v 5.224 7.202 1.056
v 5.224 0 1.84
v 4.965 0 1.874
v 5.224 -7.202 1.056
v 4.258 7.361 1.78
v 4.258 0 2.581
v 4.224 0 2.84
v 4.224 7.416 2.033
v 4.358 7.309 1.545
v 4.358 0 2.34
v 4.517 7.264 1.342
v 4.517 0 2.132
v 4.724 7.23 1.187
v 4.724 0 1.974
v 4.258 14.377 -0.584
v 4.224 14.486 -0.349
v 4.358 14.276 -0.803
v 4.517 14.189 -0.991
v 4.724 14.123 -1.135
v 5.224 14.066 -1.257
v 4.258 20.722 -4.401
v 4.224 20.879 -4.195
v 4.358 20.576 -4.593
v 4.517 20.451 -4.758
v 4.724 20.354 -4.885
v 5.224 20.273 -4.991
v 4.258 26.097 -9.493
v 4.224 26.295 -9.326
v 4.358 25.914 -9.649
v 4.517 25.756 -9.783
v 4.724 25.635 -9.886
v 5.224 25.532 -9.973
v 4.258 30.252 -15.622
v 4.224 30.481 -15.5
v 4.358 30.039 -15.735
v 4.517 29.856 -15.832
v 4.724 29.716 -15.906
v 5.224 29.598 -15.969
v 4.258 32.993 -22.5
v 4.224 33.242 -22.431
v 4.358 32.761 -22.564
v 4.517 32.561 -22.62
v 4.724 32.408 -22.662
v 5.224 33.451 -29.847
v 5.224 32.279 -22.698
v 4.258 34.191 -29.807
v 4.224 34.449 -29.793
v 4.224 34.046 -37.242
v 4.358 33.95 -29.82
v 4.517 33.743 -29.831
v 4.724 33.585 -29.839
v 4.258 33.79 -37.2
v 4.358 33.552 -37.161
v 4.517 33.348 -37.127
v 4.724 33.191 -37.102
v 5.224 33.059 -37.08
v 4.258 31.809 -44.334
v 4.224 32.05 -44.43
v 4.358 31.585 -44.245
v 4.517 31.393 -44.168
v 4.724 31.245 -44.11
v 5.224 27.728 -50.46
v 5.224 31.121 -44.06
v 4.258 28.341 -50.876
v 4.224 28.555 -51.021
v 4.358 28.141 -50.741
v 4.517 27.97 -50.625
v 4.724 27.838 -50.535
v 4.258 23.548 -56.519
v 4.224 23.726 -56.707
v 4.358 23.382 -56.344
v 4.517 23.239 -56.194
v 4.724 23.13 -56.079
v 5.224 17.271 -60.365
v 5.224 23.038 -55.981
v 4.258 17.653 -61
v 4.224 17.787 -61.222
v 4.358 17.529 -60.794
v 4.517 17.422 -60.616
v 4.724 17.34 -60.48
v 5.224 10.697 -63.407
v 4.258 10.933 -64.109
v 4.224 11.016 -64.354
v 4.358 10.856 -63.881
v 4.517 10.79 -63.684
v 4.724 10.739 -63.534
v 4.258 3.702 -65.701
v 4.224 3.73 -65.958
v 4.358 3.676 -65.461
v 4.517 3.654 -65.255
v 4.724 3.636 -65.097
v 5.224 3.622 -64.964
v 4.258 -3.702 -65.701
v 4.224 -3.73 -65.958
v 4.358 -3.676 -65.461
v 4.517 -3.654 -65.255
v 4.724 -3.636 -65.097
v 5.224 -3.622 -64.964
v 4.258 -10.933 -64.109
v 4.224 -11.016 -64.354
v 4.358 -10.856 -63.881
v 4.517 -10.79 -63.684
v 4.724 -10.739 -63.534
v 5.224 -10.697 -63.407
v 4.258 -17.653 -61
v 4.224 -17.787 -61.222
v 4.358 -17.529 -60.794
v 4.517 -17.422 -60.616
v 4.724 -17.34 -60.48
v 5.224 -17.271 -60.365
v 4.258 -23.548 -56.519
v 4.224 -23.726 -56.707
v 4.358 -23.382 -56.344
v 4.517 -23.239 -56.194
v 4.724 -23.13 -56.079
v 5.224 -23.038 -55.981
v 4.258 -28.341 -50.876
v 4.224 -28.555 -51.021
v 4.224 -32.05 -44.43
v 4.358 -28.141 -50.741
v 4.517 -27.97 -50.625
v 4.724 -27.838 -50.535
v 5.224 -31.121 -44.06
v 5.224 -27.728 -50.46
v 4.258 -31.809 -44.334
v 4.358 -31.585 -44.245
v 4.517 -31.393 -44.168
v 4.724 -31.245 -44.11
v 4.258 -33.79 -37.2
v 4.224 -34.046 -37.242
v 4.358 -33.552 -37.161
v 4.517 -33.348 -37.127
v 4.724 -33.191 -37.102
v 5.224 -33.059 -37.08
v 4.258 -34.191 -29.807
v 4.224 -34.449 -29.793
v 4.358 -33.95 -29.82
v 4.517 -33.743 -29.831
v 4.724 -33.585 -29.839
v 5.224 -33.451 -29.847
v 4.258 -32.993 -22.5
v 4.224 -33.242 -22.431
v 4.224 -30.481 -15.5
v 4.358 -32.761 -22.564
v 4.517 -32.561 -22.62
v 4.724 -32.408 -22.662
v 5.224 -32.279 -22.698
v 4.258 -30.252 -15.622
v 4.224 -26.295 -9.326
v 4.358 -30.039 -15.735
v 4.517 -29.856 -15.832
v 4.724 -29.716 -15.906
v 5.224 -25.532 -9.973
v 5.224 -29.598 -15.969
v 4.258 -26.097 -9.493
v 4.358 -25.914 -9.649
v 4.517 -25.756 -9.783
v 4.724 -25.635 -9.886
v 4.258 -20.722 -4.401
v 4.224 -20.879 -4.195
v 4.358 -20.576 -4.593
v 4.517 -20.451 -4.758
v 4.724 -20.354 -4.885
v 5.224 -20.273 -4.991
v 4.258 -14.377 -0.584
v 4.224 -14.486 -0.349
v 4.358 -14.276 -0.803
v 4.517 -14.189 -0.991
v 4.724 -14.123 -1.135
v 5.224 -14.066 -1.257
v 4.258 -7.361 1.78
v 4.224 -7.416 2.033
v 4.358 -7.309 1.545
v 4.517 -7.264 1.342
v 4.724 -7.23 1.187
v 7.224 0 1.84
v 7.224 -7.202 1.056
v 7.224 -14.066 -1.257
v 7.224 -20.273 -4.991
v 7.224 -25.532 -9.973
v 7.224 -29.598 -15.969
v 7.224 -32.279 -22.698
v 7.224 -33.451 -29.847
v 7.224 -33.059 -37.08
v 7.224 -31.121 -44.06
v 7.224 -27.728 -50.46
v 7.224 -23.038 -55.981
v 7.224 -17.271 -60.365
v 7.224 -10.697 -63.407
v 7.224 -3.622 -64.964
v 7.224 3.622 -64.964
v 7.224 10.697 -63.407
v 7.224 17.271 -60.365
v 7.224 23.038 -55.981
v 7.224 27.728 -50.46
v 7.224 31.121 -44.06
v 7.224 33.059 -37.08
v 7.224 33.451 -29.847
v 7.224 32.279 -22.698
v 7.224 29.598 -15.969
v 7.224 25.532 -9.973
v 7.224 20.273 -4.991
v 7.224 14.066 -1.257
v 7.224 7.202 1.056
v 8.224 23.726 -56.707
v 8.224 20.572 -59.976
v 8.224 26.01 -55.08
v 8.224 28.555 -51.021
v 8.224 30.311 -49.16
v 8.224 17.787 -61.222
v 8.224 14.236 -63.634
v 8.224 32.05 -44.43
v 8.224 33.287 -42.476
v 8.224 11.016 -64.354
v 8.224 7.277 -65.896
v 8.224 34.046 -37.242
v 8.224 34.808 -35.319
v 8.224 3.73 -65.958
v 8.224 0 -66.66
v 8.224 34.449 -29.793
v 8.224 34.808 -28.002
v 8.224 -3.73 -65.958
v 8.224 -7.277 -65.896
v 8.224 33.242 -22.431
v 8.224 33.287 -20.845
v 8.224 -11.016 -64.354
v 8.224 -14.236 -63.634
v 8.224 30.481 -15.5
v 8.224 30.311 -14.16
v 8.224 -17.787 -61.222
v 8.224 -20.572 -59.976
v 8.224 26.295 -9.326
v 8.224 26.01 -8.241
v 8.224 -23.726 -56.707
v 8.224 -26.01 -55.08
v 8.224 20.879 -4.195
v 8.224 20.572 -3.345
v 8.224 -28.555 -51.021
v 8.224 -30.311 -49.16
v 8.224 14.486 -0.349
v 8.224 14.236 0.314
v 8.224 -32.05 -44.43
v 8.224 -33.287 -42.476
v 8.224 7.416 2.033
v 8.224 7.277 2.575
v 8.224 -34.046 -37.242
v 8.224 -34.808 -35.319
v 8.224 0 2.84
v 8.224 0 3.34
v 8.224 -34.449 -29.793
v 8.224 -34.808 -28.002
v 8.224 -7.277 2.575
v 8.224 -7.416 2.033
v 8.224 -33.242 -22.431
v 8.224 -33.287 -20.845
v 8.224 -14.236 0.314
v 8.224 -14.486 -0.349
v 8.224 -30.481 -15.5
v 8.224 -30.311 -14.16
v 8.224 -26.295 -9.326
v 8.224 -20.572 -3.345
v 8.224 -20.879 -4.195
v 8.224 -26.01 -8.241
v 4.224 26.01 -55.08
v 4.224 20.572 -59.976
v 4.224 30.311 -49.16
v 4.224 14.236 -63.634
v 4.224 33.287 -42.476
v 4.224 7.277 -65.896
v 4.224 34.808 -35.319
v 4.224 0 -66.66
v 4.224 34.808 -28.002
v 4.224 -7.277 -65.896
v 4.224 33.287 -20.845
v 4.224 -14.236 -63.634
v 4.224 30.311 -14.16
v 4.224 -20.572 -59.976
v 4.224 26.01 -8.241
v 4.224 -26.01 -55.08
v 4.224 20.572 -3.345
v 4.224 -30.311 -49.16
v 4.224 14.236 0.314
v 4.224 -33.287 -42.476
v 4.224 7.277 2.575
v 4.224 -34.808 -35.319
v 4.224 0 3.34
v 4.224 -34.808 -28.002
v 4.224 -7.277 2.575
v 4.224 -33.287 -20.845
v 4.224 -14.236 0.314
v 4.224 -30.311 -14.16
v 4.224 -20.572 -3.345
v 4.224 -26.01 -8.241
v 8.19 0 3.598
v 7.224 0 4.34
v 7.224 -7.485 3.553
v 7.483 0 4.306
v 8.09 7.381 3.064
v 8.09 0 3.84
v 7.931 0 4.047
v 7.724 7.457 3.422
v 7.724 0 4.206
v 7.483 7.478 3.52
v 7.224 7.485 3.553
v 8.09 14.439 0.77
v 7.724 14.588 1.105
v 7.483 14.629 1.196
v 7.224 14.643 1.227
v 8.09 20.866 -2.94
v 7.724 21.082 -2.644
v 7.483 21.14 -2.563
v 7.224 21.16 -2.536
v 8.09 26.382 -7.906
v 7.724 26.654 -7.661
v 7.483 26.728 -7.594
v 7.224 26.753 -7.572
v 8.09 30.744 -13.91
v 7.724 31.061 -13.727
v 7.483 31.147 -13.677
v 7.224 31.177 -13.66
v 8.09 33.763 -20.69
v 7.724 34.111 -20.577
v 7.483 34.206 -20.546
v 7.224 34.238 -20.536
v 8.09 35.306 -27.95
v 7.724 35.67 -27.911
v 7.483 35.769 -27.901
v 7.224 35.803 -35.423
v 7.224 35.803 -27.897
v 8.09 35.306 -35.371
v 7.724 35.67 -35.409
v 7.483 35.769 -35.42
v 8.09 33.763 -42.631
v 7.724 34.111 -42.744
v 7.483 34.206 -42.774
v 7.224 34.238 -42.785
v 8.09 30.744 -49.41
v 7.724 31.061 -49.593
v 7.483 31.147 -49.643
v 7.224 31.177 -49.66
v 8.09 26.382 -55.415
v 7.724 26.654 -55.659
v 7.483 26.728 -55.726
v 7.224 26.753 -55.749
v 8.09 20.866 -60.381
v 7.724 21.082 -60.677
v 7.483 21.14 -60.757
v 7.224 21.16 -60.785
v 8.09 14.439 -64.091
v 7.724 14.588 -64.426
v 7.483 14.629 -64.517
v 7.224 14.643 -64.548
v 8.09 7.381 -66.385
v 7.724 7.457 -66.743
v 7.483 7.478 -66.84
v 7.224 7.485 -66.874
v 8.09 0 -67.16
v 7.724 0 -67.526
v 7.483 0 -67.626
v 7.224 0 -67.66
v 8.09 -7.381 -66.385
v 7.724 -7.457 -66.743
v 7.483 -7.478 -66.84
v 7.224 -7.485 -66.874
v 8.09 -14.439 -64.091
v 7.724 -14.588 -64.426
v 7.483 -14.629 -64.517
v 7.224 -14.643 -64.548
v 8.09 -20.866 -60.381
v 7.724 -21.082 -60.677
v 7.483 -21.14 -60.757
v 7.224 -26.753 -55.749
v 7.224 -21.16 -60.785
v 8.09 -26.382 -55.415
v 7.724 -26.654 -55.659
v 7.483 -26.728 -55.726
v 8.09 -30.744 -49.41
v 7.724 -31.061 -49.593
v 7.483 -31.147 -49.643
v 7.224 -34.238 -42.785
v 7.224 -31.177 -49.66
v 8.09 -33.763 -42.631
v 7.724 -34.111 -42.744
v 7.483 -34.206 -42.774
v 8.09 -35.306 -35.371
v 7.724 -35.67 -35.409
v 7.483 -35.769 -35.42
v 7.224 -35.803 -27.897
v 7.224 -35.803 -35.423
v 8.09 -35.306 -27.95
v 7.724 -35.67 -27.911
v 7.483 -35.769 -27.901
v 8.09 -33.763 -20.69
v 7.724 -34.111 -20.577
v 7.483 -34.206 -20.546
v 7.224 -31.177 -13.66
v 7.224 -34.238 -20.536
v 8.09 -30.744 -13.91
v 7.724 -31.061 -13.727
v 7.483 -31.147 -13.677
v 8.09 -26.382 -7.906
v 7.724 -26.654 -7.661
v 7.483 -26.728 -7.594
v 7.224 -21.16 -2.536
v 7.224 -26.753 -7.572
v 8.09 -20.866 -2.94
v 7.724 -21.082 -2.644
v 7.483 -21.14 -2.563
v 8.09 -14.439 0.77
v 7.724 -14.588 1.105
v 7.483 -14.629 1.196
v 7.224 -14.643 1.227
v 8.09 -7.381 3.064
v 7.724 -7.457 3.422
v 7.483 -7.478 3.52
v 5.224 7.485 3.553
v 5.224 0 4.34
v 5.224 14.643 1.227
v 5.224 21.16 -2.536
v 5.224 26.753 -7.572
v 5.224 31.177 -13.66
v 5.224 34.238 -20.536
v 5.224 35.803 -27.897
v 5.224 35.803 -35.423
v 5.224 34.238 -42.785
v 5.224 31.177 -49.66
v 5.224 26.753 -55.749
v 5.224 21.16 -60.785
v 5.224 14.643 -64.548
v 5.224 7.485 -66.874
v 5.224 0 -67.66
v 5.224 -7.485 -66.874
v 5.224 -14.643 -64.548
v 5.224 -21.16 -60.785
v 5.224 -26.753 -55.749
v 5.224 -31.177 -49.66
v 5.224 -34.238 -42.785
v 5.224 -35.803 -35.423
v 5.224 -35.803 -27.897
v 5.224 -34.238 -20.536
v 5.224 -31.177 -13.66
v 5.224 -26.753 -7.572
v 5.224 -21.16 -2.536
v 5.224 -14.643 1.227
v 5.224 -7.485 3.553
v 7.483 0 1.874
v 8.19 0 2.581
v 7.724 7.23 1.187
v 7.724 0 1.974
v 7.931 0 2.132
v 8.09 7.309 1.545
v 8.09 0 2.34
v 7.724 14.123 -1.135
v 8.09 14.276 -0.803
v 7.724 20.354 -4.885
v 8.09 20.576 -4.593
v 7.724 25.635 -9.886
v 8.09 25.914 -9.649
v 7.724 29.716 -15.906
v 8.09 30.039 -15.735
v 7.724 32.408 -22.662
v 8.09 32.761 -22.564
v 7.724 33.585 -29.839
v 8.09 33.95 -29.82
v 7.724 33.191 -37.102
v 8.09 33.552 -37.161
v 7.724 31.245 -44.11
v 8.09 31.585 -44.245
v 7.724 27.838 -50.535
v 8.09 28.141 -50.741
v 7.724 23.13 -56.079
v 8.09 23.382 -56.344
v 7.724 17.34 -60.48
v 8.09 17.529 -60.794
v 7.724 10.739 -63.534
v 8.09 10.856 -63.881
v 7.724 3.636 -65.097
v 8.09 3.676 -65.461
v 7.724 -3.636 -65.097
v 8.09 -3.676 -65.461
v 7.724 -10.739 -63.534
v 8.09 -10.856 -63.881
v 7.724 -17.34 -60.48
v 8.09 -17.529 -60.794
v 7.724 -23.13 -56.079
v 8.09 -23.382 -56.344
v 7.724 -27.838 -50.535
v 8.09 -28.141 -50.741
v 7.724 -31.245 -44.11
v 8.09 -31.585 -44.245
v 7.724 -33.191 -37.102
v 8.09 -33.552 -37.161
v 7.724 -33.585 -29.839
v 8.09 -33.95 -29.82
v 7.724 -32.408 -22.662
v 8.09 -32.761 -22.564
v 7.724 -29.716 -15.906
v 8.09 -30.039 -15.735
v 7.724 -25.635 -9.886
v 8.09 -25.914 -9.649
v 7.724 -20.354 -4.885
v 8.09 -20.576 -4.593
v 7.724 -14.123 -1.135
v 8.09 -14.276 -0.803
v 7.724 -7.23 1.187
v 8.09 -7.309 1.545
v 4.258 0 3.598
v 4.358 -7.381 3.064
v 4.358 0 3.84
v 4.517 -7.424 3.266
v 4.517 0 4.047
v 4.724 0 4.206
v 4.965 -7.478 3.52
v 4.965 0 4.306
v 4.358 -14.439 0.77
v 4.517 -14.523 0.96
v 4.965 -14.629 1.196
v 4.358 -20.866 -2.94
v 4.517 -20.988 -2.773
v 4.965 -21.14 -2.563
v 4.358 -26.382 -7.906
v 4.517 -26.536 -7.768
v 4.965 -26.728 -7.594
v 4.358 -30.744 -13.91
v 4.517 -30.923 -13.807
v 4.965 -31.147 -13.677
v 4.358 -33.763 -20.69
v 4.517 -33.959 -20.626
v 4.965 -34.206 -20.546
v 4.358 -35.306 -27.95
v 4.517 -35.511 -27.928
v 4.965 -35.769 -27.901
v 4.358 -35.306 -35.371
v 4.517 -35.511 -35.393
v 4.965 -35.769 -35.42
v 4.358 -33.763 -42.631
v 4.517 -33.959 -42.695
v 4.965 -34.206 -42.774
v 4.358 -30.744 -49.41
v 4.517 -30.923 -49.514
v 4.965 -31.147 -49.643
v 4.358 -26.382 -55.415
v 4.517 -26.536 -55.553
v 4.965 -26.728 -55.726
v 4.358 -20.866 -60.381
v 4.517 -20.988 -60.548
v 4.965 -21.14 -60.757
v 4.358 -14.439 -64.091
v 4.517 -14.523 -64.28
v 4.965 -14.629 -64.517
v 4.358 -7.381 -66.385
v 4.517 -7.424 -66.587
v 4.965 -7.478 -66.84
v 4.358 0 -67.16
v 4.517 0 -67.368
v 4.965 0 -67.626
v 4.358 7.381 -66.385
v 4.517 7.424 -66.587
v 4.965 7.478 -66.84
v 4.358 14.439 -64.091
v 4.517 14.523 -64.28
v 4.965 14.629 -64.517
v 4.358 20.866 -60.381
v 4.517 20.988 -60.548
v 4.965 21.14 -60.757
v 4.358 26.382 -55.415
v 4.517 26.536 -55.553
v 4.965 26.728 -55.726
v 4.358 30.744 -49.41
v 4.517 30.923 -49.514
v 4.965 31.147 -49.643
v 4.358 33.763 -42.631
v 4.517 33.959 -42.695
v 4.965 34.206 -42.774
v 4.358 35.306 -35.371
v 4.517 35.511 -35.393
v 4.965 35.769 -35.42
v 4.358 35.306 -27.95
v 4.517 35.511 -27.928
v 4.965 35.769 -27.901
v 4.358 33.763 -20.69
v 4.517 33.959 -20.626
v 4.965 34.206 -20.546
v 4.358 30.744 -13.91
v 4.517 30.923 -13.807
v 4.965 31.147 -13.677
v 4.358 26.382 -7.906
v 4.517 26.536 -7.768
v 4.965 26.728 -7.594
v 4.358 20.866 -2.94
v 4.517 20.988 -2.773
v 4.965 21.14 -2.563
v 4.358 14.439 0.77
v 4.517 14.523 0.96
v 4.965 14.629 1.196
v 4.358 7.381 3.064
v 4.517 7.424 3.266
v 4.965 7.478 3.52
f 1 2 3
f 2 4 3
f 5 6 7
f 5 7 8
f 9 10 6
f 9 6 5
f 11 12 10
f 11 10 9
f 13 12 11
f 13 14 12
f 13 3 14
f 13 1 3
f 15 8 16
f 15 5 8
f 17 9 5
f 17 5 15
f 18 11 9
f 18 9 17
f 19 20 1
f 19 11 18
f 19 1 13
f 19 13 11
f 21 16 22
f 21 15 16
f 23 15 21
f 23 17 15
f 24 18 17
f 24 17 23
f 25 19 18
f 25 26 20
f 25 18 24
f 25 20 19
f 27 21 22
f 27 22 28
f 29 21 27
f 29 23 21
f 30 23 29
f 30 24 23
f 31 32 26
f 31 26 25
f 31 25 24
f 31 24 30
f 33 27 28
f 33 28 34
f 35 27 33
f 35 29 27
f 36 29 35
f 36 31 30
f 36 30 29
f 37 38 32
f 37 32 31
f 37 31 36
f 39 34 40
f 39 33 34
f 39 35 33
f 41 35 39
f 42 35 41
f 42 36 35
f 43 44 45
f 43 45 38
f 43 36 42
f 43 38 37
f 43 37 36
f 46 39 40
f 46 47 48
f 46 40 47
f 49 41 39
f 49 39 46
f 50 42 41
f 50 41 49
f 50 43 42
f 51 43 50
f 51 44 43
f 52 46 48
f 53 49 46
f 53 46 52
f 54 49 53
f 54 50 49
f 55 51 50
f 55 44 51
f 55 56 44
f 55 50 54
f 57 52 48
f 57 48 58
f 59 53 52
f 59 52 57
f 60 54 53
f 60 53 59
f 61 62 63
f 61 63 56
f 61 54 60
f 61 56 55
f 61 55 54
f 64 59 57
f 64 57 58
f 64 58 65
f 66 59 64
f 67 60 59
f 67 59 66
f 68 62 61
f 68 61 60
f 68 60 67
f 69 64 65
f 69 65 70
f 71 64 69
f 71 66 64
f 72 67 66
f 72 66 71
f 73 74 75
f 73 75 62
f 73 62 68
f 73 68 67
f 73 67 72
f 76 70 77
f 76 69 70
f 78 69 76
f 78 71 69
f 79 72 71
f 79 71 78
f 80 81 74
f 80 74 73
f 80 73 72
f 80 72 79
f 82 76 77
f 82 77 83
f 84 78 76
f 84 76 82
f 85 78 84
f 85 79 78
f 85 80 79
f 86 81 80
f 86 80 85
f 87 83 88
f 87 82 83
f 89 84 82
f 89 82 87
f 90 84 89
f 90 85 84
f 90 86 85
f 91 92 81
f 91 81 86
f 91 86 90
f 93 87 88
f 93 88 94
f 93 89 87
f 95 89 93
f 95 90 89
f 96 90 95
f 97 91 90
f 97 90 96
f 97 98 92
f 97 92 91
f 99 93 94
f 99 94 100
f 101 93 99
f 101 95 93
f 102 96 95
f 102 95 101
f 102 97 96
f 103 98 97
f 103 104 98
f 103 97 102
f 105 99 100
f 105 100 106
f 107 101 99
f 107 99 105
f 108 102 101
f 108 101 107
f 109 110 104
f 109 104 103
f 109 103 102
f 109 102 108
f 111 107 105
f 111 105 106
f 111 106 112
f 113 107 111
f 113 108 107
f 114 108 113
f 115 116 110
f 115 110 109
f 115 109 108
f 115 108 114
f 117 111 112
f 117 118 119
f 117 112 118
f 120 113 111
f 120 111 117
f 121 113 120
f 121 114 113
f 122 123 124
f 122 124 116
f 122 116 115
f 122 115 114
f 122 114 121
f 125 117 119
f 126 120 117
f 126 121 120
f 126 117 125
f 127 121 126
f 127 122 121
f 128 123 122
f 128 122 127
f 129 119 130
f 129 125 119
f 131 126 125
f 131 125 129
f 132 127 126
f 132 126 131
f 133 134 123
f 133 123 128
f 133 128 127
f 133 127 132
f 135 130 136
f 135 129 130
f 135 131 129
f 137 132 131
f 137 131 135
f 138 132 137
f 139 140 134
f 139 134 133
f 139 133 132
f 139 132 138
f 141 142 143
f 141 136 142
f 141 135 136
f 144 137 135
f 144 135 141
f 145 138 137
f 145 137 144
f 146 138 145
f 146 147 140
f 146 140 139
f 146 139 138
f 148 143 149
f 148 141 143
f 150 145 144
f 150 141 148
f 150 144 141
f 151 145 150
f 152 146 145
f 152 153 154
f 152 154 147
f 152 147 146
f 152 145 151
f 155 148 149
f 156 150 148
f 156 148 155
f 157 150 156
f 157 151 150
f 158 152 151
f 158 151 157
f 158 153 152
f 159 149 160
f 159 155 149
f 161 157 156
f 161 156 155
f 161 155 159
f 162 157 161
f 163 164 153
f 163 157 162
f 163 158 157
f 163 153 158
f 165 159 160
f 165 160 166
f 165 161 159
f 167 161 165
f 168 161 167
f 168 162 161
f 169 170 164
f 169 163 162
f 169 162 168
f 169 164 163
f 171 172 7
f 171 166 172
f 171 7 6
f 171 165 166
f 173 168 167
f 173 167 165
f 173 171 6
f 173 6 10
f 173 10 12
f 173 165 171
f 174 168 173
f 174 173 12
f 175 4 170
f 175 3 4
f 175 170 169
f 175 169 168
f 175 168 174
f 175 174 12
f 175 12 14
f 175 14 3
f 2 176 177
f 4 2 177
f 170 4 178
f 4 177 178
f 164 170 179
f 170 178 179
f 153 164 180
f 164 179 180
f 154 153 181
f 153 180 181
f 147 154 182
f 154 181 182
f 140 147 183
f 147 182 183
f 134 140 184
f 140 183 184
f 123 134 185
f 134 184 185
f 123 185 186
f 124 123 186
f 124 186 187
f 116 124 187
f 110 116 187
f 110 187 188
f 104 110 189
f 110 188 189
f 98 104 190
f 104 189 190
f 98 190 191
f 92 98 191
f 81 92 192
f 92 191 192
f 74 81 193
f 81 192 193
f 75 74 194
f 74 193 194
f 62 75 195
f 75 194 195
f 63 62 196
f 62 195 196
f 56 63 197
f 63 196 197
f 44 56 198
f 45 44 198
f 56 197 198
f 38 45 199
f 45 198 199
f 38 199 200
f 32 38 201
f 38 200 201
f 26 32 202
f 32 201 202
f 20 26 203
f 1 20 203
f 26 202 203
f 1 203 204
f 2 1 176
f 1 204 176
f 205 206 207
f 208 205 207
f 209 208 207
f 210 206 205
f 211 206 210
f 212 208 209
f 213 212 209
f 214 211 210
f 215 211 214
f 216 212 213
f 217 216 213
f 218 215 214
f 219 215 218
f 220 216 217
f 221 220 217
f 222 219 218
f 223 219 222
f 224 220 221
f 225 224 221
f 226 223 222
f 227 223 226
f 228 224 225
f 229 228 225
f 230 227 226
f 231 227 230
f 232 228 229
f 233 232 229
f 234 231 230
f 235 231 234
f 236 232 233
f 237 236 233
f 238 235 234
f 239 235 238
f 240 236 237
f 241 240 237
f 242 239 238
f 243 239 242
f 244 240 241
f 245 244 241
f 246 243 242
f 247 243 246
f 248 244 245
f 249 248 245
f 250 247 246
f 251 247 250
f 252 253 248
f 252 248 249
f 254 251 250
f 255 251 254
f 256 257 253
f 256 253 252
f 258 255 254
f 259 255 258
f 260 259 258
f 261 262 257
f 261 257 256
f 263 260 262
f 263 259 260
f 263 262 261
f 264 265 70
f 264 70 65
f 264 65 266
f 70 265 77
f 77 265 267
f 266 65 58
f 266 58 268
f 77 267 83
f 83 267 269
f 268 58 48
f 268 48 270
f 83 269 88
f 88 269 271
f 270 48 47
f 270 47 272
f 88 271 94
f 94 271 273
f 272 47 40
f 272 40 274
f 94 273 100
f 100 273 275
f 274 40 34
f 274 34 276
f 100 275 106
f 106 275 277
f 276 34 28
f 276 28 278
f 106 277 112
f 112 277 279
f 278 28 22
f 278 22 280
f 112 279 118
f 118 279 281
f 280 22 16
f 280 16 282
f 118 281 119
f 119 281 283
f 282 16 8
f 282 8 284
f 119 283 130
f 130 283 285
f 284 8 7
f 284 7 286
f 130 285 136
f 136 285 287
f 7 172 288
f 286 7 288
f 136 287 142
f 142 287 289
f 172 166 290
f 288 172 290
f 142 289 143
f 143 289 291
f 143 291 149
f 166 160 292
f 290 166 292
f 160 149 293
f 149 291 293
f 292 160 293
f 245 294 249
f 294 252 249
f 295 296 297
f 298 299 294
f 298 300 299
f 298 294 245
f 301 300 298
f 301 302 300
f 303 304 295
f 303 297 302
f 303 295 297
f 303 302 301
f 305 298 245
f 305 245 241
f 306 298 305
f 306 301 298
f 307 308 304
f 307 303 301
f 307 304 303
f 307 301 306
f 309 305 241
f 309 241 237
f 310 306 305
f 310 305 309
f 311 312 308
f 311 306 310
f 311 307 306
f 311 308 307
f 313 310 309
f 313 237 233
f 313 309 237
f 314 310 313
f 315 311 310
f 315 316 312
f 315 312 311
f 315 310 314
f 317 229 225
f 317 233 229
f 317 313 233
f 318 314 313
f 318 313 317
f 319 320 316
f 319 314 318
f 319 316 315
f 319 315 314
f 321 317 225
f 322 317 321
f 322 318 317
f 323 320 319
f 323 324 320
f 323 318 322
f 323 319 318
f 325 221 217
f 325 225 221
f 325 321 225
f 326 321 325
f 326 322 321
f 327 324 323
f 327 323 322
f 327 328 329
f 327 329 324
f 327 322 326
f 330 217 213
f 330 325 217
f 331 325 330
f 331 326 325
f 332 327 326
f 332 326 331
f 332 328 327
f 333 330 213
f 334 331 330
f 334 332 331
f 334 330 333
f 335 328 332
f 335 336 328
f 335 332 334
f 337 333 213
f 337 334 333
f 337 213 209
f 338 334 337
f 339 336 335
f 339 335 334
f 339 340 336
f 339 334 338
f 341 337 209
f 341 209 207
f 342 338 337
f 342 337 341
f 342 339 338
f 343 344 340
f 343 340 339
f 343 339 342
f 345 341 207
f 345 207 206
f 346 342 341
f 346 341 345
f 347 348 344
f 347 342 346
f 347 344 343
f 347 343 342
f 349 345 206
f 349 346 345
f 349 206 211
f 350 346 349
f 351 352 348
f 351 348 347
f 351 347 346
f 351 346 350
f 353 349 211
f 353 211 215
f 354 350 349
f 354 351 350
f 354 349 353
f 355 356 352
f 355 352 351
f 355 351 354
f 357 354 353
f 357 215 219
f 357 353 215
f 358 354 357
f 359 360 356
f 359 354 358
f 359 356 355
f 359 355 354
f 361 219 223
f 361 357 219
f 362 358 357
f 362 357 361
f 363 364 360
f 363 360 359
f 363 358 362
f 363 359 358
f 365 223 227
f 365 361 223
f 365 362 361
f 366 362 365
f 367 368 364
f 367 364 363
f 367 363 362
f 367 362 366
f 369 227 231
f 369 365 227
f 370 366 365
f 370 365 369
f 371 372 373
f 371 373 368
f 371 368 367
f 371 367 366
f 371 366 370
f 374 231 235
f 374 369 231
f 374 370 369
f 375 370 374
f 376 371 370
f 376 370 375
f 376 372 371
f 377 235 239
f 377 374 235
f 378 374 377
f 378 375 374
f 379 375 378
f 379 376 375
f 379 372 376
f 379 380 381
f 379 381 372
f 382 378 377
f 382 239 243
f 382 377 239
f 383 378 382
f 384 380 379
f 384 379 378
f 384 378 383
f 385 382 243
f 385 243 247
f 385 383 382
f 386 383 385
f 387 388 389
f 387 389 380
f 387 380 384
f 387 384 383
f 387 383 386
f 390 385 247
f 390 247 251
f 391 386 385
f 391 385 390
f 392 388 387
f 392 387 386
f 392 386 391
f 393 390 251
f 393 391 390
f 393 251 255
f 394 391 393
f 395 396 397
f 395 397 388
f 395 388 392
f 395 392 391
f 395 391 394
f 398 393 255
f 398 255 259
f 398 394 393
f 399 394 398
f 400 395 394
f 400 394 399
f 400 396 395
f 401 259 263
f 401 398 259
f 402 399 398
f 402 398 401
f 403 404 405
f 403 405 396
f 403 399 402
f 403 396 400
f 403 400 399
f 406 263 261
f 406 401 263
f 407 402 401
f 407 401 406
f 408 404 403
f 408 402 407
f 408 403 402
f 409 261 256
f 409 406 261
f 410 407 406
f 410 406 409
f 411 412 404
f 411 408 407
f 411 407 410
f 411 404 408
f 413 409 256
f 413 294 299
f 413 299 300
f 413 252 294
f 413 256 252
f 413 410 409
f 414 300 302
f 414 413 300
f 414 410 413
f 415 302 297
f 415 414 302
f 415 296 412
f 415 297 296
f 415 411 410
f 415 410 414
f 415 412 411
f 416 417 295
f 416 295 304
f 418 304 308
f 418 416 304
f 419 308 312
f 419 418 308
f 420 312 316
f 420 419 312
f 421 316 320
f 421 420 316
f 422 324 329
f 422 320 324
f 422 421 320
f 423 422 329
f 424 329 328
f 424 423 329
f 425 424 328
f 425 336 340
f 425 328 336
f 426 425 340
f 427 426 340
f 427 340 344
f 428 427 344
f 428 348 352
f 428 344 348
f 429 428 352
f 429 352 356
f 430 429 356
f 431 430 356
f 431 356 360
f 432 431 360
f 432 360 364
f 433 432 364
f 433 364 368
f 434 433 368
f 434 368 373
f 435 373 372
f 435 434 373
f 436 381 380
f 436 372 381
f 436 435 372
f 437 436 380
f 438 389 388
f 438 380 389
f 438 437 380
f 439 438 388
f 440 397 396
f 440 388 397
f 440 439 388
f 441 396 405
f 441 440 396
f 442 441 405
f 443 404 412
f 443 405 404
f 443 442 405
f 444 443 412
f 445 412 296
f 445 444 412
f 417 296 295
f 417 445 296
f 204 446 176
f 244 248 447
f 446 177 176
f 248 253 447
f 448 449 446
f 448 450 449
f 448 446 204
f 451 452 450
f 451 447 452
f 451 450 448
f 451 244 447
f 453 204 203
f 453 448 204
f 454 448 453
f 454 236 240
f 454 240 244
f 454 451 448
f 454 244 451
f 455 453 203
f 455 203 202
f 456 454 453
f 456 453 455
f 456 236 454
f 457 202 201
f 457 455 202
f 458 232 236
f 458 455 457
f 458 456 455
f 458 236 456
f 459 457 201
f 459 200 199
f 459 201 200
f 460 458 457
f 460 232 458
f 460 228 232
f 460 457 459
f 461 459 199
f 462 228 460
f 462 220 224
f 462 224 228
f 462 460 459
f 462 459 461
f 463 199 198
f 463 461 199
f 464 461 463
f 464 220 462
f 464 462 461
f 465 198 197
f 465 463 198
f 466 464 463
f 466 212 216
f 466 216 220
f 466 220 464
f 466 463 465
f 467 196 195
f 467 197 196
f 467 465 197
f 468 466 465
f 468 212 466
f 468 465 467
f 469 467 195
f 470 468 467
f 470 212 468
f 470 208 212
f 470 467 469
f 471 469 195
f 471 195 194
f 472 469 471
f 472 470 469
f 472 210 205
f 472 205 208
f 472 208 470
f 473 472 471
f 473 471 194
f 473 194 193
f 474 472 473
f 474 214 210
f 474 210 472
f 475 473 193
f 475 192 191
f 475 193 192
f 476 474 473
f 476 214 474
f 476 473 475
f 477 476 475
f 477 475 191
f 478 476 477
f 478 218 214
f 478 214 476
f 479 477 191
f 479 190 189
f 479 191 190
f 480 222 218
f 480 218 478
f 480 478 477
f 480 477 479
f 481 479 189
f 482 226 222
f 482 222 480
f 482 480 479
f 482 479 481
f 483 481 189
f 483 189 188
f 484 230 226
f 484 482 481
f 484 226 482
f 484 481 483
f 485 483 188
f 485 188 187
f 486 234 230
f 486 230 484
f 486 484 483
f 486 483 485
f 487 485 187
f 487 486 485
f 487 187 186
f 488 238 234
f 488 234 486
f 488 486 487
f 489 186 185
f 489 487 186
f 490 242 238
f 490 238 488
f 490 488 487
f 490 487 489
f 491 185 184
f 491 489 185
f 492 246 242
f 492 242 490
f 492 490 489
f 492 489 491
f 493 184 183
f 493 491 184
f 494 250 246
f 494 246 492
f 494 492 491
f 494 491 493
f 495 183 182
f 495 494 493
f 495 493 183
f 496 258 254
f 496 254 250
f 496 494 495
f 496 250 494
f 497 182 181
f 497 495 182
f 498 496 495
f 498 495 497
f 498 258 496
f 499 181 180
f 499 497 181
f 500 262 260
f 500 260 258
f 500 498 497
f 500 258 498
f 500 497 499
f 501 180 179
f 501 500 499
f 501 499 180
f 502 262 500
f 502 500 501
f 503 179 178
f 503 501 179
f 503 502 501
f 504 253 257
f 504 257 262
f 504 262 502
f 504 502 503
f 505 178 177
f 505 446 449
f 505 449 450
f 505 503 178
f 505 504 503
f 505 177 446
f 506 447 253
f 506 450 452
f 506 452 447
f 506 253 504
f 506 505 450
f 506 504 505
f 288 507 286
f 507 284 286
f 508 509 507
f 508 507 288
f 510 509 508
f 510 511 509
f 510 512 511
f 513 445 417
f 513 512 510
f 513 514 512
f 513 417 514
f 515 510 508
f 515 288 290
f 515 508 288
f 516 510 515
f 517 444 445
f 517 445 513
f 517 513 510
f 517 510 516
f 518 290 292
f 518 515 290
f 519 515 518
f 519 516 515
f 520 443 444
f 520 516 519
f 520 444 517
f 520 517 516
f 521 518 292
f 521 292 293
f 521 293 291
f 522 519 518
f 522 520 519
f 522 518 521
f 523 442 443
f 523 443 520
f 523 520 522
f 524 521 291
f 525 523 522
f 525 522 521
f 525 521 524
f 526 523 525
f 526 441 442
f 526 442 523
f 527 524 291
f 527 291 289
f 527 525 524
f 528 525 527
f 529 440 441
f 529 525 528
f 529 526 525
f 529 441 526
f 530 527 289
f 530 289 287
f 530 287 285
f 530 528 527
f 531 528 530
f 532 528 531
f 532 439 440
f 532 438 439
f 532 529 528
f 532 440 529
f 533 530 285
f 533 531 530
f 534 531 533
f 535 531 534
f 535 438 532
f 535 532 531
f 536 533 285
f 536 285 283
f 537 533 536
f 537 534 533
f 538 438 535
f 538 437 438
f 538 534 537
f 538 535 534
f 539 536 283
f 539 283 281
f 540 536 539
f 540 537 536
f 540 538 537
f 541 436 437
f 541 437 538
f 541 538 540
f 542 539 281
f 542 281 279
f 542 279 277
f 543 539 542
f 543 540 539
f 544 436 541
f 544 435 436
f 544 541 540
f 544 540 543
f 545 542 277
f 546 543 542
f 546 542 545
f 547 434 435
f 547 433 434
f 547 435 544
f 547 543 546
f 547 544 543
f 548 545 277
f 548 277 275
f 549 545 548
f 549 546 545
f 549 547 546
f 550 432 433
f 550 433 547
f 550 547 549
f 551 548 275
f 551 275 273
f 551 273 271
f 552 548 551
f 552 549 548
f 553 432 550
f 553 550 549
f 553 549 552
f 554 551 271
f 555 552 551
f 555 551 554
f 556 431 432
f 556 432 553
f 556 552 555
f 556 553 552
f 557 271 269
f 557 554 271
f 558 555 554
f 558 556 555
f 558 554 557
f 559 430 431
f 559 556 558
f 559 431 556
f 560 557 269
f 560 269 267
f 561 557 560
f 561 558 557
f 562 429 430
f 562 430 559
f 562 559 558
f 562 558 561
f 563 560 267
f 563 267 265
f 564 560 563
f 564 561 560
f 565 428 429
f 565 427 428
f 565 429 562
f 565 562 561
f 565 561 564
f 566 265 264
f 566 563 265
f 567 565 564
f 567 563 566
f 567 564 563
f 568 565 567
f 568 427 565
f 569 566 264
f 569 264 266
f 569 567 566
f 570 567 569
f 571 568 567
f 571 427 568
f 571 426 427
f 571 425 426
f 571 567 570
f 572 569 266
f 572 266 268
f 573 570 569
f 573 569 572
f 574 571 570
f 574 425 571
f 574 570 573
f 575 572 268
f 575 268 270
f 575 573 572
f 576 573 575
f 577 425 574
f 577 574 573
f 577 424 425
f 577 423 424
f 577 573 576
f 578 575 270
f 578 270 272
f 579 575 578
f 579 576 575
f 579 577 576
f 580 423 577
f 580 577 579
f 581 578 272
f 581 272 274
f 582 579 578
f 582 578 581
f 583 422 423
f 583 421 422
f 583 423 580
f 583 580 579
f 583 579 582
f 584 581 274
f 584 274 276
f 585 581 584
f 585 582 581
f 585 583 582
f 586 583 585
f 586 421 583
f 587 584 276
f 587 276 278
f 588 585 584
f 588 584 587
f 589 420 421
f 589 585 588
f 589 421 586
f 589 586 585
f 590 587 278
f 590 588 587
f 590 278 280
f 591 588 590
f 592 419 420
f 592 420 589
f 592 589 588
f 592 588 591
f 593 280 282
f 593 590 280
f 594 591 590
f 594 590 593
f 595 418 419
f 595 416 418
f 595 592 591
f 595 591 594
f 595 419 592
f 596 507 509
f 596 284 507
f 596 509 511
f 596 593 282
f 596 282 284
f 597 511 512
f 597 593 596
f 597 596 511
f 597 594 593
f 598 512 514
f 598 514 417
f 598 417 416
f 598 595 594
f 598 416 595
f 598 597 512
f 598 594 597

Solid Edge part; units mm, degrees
sketch "Sketch1" plane through (0, 0, 0) normal (0, -1, 0) x (1, 0, 0)
  arc A0 (7.2243, 1.8396) -> (8.2243, 2.8396) centre (7.2243, 2.8396) ccw
  line L0 (8.2243, 2.8396) -> (8.2243, 3.3396)
  arc A1 (8.2243, 3.3396) -> (7.2243, 4.3396) centre (7.2243, 3.3396) ccw
  line L1 (7.2243, 4.3396) -> (5.2243, 4.3396)
  arc A2 (4.2243, 3.3396) -> (5.2243, 4.3396) centre (5.2243, 3.3396) cw
  line L2 (4.2243, 3.3396) -> (4.2243, 2.8396)
  arc A3 (4.2243, 2.8396) -> (5.2243, 1.8396) centre (5.2243, 2.8396) ccw
  line L3 (5.2243, 1.8396) -> (7.2243, 1.8396)
revolve "RevolvedProtrusion1" add sketch "Sketch1" angle 360 about axis through (6.2243, 0, -31.6604) along (1, 0, 0)
